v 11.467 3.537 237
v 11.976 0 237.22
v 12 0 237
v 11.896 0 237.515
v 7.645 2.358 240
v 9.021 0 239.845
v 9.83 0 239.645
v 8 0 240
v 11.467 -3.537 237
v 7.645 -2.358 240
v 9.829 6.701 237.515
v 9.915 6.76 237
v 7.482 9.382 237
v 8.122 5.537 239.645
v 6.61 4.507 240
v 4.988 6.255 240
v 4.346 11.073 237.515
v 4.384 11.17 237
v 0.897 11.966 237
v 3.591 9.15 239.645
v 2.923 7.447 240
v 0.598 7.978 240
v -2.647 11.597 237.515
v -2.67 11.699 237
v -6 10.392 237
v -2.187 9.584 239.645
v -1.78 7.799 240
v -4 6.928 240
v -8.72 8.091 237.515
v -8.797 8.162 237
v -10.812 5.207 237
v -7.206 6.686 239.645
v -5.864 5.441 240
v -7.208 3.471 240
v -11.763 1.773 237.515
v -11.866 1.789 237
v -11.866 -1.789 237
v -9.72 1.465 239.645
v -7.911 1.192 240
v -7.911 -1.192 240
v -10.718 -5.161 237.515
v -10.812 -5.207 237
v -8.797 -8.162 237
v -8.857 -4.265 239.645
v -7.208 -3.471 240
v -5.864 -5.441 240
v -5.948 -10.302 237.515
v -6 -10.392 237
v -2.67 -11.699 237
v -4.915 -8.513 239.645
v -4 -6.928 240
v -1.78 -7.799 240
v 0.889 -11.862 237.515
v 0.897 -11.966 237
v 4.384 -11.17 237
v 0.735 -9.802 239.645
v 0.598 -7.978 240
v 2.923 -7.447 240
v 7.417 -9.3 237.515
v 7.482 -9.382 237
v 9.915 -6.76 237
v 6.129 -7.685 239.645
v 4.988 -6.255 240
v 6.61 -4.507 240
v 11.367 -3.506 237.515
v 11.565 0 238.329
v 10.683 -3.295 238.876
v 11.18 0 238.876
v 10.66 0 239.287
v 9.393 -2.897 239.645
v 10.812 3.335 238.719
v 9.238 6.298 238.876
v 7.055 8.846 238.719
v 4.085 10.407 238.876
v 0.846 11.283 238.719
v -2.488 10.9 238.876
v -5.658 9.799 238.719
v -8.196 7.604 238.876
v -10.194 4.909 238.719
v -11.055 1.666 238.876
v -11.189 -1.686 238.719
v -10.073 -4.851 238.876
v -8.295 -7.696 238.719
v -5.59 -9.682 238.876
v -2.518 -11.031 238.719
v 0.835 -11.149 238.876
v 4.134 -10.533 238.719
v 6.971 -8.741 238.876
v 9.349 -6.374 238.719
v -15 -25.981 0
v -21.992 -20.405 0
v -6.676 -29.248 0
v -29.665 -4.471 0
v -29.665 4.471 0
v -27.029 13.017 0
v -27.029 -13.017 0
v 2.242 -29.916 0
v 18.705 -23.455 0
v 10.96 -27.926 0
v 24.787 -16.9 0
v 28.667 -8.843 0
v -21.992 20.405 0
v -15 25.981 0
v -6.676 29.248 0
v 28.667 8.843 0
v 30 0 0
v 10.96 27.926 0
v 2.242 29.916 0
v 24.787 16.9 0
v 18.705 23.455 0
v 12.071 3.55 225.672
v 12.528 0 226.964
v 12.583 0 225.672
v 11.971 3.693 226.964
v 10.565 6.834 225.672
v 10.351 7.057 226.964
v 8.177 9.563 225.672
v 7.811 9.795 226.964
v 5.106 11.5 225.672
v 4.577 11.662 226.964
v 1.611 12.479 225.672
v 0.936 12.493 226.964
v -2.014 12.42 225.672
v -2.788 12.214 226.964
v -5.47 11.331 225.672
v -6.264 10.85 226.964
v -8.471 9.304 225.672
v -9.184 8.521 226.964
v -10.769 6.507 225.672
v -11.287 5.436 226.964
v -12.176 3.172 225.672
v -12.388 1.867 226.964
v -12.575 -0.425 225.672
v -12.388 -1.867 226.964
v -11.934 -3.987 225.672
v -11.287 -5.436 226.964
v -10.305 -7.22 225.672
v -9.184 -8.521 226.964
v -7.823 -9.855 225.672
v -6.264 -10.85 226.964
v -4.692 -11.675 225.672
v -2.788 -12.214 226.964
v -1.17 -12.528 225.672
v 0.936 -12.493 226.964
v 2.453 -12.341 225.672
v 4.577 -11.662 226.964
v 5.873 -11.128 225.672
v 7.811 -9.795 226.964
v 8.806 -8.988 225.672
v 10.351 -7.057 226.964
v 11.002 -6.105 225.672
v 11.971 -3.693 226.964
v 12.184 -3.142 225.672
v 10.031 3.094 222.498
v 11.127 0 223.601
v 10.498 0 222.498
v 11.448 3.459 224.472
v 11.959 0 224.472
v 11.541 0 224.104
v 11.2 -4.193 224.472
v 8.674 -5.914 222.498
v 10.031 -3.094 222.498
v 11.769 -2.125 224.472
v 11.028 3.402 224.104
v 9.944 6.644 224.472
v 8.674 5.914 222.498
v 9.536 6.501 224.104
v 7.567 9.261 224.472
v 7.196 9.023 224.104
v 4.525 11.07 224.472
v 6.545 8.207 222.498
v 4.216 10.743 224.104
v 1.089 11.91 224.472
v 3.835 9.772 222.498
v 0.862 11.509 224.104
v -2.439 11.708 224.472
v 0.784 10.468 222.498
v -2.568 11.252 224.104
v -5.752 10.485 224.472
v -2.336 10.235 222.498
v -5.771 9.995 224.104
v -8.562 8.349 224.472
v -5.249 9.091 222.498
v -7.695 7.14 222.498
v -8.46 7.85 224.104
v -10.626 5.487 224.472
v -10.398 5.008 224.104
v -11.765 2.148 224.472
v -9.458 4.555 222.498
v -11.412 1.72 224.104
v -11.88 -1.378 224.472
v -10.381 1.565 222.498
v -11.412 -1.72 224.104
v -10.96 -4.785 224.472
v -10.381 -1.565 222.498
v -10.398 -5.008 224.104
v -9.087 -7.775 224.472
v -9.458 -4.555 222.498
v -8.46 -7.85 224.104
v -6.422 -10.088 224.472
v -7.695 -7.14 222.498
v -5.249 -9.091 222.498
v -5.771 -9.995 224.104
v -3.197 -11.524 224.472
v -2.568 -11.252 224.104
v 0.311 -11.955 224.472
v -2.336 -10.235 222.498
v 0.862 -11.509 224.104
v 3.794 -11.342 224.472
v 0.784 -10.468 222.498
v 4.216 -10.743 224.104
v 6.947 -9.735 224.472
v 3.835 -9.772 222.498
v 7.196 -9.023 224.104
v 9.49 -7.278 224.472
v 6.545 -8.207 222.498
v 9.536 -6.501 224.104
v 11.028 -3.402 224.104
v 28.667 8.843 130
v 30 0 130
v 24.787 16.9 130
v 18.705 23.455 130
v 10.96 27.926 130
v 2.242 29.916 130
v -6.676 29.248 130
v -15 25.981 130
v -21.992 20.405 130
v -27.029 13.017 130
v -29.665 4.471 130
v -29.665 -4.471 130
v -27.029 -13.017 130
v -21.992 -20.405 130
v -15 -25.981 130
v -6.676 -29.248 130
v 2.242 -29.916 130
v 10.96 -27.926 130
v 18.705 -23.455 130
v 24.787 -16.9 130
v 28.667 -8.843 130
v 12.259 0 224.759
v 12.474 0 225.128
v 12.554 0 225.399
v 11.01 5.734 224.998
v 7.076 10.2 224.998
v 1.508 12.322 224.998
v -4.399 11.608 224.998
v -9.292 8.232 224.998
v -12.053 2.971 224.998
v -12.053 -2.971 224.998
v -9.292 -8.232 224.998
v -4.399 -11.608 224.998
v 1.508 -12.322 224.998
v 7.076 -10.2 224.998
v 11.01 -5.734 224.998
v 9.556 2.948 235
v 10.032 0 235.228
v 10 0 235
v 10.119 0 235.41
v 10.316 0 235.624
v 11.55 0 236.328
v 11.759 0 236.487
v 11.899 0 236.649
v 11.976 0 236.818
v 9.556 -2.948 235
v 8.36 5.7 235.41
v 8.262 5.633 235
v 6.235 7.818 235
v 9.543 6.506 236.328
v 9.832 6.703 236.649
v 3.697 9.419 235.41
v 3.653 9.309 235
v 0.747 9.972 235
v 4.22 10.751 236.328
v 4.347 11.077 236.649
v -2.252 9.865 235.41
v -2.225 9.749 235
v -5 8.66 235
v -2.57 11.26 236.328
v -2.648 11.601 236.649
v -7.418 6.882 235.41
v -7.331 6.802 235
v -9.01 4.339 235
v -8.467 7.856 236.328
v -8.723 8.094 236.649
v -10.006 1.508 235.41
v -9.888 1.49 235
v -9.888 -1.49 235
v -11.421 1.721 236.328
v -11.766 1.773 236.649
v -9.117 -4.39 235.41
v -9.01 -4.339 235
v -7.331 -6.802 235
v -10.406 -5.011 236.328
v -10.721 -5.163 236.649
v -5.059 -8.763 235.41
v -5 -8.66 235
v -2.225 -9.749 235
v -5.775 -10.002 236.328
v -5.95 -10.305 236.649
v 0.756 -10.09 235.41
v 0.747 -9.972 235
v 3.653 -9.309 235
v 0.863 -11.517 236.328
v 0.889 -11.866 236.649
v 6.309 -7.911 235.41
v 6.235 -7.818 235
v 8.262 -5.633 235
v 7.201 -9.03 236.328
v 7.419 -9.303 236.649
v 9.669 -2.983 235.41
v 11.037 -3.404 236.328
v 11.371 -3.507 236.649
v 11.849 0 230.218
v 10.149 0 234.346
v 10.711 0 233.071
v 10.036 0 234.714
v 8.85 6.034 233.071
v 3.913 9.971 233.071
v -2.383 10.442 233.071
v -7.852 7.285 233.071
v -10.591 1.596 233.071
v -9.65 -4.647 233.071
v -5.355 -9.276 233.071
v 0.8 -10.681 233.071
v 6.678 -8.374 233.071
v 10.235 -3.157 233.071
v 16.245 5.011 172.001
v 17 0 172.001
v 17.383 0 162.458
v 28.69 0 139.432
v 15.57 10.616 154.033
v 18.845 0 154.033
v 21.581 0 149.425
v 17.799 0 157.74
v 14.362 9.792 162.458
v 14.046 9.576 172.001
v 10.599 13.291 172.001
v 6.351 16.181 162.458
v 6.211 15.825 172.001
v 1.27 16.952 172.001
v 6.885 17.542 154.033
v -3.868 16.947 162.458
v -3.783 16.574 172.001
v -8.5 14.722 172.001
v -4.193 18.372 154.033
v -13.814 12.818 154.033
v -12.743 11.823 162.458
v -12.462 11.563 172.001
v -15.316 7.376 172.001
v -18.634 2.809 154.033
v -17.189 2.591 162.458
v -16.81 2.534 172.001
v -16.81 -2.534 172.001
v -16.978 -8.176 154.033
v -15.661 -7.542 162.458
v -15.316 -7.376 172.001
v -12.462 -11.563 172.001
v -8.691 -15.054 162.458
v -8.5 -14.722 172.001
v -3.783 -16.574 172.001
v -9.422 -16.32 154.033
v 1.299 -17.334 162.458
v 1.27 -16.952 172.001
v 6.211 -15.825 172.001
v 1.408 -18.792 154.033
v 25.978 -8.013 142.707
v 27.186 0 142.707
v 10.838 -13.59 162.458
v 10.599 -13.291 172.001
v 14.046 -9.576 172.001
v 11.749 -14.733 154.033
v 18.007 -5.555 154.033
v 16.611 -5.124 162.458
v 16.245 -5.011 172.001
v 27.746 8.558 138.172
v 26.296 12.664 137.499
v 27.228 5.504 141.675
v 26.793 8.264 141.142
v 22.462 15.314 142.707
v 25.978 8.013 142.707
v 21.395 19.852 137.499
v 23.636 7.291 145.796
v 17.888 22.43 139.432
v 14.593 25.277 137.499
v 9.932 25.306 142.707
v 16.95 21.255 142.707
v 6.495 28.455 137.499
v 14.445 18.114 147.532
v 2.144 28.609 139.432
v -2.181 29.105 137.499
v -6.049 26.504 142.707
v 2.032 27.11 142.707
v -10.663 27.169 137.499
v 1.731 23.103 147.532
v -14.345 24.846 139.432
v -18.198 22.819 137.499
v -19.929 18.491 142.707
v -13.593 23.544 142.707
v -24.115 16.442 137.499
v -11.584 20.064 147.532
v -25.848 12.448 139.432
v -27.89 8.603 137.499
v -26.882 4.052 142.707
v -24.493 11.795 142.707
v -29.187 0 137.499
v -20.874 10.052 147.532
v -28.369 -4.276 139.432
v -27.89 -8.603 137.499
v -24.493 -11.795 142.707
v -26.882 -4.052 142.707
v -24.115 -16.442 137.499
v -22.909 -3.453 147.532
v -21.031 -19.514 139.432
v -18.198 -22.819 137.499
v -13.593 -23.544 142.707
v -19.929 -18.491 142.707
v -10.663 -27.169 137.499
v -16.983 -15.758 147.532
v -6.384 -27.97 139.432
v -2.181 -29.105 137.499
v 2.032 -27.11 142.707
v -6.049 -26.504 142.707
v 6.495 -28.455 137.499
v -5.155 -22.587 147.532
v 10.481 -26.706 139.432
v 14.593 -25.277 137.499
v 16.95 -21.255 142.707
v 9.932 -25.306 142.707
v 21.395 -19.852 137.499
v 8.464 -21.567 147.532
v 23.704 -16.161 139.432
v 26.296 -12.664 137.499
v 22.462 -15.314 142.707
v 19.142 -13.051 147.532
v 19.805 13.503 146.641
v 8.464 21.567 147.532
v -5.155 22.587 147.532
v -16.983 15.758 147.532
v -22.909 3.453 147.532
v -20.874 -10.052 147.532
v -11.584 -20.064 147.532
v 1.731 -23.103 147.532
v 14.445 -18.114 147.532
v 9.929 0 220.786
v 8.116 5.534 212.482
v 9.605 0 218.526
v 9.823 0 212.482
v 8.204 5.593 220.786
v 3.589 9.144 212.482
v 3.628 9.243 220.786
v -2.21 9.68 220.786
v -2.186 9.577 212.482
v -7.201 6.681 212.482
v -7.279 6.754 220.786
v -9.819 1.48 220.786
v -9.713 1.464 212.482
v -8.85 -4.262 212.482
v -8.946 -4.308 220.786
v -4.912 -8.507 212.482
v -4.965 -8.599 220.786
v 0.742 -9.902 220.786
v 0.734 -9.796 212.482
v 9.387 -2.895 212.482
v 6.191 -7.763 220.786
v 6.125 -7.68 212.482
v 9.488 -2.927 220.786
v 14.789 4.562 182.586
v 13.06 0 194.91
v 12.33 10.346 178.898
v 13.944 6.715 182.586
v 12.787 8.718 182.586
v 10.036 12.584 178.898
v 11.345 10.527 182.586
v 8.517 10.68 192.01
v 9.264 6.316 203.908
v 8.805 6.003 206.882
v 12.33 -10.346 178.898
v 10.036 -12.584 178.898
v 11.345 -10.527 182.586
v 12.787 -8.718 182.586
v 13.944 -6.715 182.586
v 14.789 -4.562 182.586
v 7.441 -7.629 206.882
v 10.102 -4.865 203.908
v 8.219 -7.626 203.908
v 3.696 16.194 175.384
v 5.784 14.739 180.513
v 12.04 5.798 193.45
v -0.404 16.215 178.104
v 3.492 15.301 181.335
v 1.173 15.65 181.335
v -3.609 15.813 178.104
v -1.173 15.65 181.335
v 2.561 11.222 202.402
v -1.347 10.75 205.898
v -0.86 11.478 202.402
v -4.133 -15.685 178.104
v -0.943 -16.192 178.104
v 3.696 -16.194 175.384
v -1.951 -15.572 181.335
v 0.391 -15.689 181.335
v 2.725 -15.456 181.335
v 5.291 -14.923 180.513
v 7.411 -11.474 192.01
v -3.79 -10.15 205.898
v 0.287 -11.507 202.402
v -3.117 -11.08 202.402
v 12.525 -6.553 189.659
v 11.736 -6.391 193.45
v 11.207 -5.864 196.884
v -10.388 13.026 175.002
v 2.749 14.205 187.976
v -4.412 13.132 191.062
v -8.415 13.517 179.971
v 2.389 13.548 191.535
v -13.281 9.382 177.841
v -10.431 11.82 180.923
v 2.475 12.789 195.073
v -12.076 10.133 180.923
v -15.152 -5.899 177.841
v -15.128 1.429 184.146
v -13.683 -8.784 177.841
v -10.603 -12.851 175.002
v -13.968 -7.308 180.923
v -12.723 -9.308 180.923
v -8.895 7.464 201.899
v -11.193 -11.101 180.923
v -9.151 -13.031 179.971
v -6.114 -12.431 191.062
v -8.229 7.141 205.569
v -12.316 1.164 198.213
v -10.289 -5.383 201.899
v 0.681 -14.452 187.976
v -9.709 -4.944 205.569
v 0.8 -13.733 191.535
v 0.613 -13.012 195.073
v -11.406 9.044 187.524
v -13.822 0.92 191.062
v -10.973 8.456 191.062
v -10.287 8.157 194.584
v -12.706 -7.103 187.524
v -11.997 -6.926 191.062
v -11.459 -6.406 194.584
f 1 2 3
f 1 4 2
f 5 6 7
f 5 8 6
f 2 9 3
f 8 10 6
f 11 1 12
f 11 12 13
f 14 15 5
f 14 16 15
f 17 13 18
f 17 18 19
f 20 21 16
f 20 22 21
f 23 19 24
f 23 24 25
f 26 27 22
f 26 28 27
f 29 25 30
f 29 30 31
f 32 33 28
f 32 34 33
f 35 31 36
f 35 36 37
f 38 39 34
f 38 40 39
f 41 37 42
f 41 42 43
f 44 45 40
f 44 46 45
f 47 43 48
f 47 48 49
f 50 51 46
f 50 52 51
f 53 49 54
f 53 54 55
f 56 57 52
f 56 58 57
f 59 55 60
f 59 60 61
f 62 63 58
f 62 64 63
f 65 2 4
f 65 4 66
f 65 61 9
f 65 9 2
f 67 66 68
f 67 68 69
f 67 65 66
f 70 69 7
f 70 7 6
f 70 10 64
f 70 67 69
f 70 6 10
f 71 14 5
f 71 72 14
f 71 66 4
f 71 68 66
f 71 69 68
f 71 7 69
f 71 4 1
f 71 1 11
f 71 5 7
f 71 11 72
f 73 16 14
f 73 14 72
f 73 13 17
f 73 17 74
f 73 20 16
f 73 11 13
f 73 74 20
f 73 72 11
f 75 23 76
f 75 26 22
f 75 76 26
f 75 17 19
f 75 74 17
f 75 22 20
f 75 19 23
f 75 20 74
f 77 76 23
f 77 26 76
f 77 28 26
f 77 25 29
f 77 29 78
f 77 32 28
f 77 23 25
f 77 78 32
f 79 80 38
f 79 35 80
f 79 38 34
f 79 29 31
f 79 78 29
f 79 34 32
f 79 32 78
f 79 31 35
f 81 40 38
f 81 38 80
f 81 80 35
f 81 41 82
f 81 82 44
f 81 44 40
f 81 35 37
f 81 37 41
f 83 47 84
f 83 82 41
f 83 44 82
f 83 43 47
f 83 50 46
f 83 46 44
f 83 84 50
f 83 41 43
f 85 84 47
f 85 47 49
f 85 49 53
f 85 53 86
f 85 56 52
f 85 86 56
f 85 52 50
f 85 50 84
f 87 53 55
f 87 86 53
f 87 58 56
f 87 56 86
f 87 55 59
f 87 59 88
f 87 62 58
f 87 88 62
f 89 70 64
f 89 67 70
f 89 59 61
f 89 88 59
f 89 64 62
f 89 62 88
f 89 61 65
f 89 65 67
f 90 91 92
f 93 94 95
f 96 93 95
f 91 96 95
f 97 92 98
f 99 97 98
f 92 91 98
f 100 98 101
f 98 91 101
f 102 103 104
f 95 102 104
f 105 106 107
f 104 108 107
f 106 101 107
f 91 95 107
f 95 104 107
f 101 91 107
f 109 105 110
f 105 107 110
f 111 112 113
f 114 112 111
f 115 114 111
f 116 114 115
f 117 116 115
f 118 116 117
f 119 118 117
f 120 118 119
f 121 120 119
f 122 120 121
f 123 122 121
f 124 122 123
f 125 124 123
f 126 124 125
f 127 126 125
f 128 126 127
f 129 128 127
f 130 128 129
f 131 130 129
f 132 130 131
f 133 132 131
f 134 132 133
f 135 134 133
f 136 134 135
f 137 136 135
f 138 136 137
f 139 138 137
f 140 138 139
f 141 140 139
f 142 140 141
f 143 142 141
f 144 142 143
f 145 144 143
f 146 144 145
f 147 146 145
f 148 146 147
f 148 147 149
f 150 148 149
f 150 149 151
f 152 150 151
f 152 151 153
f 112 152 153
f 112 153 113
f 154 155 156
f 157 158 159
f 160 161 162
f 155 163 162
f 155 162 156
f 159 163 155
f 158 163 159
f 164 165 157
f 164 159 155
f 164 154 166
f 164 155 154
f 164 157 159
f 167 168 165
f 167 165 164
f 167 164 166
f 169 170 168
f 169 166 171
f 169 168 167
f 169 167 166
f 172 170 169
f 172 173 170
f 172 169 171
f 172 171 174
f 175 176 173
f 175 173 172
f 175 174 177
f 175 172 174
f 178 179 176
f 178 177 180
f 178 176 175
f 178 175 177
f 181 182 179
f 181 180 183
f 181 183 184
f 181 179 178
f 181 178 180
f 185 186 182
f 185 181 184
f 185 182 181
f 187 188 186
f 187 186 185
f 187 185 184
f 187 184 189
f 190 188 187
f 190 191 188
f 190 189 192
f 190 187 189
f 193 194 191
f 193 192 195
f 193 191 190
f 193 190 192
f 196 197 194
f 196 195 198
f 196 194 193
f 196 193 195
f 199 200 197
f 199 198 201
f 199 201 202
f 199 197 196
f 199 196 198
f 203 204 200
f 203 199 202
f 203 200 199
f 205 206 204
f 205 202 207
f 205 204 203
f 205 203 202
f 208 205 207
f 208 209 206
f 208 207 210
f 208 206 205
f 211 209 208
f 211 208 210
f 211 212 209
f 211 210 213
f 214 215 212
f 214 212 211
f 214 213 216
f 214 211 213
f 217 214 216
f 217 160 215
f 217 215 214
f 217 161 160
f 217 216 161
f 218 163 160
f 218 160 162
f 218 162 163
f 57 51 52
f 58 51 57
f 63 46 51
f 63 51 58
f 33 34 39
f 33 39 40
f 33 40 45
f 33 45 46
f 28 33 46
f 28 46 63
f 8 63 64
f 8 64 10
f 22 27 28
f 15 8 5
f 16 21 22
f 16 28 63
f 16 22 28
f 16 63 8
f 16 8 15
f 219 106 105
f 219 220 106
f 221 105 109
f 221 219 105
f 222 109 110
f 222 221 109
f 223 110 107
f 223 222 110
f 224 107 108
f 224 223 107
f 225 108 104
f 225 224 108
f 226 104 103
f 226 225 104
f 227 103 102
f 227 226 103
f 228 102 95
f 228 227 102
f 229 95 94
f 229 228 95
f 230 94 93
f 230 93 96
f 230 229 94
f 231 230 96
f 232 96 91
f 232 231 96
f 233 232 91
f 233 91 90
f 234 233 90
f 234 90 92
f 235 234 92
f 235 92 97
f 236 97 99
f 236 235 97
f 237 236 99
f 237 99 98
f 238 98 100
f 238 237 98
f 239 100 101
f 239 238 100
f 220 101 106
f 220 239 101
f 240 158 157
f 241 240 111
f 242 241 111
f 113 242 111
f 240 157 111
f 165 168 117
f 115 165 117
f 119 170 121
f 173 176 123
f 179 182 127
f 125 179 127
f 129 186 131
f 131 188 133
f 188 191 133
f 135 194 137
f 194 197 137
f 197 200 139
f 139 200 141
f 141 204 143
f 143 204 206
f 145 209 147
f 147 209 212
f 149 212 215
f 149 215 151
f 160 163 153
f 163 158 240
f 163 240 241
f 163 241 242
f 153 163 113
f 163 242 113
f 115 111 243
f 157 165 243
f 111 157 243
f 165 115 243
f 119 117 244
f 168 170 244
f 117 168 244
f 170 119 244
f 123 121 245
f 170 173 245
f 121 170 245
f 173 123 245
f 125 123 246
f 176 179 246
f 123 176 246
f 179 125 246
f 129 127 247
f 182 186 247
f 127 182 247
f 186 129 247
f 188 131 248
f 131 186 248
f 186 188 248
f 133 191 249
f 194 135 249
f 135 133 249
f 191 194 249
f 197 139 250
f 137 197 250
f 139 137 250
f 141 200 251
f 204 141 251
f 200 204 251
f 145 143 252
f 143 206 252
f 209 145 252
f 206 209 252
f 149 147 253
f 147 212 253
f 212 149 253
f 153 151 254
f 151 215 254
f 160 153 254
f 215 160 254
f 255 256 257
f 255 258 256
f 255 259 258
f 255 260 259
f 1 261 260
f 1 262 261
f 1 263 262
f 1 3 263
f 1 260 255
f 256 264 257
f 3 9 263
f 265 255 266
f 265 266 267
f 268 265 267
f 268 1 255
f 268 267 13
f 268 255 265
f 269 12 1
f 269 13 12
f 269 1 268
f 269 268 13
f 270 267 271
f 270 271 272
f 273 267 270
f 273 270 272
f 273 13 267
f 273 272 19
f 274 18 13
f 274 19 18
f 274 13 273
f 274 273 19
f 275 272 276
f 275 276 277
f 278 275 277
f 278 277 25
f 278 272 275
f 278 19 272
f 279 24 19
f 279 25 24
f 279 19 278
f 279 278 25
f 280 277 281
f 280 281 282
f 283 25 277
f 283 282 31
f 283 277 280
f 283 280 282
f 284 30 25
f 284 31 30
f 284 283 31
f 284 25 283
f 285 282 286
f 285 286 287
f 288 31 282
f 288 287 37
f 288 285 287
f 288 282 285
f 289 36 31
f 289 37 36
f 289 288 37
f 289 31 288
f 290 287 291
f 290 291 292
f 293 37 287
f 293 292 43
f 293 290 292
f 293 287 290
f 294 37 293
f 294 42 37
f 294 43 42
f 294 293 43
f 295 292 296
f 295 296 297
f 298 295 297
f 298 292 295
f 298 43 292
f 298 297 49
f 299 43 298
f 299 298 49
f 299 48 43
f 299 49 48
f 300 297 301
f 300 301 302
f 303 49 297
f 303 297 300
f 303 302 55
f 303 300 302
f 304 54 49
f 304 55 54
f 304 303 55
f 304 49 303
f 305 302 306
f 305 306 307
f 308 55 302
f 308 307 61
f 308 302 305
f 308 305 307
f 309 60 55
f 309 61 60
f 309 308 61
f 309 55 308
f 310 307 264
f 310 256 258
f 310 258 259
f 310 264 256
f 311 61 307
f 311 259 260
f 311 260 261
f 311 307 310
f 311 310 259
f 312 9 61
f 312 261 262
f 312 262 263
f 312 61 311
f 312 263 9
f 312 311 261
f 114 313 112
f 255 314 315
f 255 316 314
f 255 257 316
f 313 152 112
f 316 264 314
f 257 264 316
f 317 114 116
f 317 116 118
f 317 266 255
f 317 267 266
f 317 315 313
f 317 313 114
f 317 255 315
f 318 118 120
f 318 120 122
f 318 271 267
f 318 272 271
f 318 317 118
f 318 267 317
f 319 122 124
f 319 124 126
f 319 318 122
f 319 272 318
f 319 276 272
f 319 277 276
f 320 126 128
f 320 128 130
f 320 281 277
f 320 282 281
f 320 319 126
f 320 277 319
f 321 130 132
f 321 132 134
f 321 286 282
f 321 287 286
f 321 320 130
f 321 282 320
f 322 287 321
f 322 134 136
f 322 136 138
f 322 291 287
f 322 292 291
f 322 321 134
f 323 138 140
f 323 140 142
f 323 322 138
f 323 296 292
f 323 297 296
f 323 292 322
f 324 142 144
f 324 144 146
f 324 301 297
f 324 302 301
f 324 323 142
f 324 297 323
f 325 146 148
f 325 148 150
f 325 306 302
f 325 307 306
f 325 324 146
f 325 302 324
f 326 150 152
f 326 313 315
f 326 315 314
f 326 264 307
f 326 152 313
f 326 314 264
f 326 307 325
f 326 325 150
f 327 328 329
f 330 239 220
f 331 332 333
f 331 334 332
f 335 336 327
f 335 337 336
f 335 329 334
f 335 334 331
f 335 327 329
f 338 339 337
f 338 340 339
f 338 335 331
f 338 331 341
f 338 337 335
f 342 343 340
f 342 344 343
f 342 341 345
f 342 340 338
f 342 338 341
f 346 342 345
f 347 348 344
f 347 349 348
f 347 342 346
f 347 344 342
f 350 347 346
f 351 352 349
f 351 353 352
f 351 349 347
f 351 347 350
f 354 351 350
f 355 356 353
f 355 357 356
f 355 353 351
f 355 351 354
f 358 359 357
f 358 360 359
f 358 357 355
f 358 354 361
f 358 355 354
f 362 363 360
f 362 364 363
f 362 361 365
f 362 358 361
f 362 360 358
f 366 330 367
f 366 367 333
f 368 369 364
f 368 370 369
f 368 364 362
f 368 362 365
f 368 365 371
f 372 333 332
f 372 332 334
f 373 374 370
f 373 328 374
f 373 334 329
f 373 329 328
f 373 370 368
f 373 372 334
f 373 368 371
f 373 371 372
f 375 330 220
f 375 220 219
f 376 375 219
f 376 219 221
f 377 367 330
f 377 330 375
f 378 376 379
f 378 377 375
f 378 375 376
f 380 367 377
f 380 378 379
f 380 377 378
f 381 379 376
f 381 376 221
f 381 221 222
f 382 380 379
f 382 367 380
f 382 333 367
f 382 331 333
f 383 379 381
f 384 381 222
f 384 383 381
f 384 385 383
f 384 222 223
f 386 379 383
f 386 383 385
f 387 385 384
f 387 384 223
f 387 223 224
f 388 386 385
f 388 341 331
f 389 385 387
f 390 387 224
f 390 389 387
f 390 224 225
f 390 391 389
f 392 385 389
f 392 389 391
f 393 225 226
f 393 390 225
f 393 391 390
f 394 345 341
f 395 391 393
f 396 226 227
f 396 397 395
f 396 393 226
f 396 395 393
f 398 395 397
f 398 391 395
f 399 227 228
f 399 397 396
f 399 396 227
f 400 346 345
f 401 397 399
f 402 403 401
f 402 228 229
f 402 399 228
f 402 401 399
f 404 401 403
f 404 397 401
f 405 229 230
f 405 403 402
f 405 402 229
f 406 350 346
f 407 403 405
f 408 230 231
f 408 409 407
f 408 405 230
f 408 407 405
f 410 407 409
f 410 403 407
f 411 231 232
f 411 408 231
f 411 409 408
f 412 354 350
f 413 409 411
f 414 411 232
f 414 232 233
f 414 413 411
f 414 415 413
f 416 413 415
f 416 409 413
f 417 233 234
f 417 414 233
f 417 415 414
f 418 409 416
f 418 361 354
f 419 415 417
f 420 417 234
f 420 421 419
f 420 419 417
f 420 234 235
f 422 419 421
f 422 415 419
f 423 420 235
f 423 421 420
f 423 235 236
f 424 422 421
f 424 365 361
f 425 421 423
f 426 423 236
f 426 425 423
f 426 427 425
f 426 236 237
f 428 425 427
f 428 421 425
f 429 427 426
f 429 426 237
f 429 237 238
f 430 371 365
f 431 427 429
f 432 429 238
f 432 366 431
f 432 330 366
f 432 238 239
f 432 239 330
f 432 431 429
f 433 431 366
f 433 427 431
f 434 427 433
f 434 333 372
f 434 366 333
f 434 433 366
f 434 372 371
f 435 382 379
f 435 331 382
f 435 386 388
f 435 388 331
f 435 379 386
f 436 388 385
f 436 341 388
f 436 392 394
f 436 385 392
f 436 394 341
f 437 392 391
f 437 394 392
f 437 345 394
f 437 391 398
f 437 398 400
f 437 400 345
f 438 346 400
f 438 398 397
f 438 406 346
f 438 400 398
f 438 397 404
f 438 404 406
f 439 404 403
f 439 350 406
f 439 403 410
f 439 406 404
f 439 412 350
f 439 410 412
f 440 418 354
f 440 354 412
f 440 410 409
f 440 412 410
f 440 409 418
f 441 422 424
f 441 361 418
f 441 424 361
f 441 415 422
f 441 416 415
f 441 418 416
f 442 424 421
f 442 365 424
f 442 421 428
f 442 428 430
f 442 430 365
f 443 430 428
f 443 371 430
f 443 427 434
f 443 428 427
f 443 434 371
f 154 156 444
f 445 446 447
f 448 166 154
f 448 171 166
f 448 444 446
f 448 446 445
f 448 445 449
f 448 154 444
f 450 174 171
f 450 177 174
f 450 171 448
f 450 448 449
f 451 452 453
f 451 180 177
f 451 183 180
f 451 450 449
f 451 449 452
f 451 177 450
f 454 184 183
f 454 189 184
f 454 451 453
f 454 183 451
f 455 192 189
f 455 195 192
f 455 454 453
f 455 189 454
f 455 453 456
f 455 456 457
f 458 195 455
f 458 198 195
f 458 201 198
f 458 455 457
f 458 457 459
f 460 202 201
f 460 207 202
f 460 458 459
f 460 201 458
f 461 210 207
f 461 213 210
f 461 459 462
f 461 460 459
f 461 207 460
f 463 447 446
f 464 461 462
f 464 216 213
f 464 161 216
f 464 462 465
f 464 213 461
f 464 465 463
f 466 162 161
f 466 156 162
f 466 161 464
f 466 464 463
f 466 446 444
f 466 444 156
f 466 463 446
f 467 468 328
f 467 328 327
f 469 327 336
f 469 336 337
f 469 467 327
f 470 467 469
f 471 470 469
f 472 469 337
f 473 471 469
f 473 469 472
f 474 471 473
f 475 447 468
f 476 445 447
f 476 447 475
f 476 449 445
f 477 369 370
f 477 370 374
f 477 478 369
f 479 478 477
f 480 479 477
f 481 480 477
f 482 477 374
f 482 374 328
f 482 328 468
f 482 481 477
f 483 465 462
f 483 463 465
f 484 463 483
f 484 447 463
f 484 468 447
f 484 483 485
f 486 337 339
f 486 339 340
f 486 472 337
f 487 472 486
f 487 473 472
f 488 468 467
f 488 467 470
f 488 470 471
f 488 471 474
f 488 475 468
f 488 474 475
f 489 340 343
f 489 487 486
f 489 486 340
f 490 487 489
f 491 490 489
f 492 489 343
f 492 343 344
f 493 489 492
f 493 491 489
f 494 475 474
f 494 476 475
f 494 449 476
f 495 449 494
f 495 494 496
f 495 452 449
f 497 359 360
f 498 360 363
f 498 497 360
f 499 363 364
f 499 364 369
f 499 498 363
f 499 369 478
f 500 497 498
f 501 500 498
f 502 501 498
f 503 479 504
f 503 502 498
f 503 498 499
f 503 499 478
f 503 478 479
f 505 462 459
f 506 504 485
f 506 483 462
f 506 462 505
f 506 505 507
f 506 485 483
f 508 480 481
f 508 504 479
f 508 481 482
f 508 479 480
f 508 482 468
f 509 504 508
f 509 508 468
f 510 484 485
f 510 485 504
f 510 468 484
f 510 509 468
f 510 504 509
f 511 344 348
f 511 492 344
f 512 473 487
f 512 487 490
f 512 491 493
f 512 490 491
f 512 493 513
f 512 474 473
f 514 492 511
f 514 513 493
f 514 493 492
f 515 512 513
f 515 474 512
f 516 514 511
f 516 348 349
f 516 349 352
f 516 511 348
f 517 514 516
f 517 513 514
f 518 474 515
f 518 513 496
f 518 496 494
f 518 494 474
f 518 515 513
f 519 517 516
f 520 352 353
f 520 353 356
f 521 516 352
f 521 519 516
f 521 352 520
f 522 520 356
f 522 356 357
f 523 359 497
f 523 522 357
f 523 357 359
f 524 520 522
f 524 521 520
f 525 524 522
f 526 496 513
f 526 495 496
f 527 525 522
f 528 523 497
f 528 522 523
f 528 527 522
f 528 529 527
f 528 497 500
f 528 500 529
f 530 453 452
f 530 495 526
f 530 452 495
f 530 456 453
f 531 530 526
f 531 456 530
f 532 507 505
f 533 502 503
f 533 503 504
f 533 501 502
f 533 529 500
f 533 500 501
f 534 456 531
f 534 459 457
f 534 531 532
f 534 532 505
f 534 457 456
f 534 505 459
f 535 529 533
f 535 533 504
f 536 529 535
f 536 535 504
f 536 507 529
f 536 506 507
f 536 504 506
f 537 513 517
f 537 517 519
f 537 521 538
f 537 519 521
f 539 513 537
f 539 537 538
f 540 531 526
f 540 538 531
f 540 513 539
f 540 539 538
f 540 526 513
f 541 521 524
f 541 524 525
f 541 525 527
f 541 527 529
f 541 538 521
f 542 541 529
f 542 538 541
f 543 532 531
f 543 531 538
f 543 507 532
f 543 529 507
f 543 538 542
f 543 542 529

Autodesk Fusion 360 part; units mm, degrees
sketch "Sketch1" plane through (0, 0, 0) normal (0, 1, 0) x (1, 0, 0)
  line L0 (0, 0) -> (0, -240)
  line L1 (0, 0) -> (30, 0)
  line L2 (30, 0) -> (30, -130)
  spline S0 degree 5 poles (30, -130) (29.9765, -130.5738) (29.9204, -131.6926) (29.8084, -133.2846) (29.6036, -135.235) (29.2504, -137.391) (28.7863, -139.284) (28.1857, -140.9528) (27.4028, -142.4662) (26.3864, -143.9173) (25.1131, -145.4043) (23.6149, -147.0156) (22.0109, -148.8121) (20.4671, -150.8302) (19.151, -153.0839) (18.1911, -155.5676) (17.6291, -158.2582) (17.3904, -161.1182) (17.3386, -164.106) (17.3136, -167.1843) (17.1813, -170.3303) (16.8672, -173.5425) (16.4268, -176.856) (15.8829, -180.3105) (15.2457, -183.9433) (14.5178, -187.7806) (13.7043, -191.8294) (12.8205, -196.0692) (11.9002, -200.4438) (11.0056, -204.8517) (10.2328, -209.1403) (9.6869, -213.1347) (9.4586, -216.6645) (9.6016, -219.5898) (10.1061, -221.8312) (10.8818, -223.3904) (11.5446, -224.1973) (12.0407, -224.5695) (12.3702, -224.7147) (12.5347, -224.7615) knots 0 0 0 0 0 0 0.028571 0.057143 0.085714 0.114286 0.142857 0.171429 0.2 0.228571 0.257143 0.285714 0.314286 0.342857 0.371429 0.4 0.428571 0.457143 0.485714 0.514286 0.542857 0.571429 0.6 0.628571 0.657143 0.685714 0.714286 0.742857 0.771429 0.8 0.828571 0.857143 0.885714 0.914286 0.942857 0.971429 1 1 1 1 1 1
  spline S1 degree 5 poles (12.5347, -224.7615) (12.5672, -225.1026) (12.605, -225.796) (12.5803, -226.8697) (12.387, -228.3526) (11.9068, -230.1993) (11.2582, -231.9222) (10.5553, -233.4058) (10.003, -234.5642) (9.843, -235.3668) (10.5718, -235.8733) (11.6234, -236.2748) (12.1639, -236.7697) (11.9167, -237.4572) (11.6619, -238.2348) (11.2194, -239.0006) (10.4447, -239.5113) (9.4203, -239.7979) (8.5112, -239.9407) (8, -240) knots 0 0 0 0 0 0 0.066667 0.133333 0.2 0.266667 0.333333 0.4 0.466667 0.533333 0.6 0.666667 0.733333 0.8 0.866667 0.933333 1 1 1 1 1 1
  line L3 (17.898, -162.5327) -> (16.102, -181.4673)
  line L4 (7.9977, -216.9977) -> (12.9977, -227.9977)
  line L5 (12.3644, -222.9737) -> (12.7049, -226.5494)
  line L6 (10, -234) -> (10, -236)
  line L7 (12, -236) -> (12, -238)
  line L8 (11.8794, -239.5497) -> (4.1206, -240.4503)
  line L9 (8, -240) -> (0, -240)
  point P0 (28.5, -140)
  point P1 (25, -145.5)
  point P2 (18.454, -155.0935)
  point P3 (17, -172)
  point P4 (12, -200)
  point P5 (10.4977, -222.4977)
  point P6 (10, -235)
  point P7 (12, -237)
  dimension "d1" = 240
  dimension "d2" = 30
  dimension "d3" = 90
  dimension "d4" = 130
sketch "Sketch2" plane through (0, 0, 0) normal (0, 1, 0) x (1, 0, 0)
revolve "Revolve1" add sketch "Sketch1" angle 360 about axis through (0, 0, 0) along (0, 0, 1)
fillet "Fillet1" radius 1.5 1 edges at (-11.6864, -4.5327, 224.7615)
shell "Shell1" thickness 0.75 removed faces 1 at (-2.2732, -5.7921, 240)
